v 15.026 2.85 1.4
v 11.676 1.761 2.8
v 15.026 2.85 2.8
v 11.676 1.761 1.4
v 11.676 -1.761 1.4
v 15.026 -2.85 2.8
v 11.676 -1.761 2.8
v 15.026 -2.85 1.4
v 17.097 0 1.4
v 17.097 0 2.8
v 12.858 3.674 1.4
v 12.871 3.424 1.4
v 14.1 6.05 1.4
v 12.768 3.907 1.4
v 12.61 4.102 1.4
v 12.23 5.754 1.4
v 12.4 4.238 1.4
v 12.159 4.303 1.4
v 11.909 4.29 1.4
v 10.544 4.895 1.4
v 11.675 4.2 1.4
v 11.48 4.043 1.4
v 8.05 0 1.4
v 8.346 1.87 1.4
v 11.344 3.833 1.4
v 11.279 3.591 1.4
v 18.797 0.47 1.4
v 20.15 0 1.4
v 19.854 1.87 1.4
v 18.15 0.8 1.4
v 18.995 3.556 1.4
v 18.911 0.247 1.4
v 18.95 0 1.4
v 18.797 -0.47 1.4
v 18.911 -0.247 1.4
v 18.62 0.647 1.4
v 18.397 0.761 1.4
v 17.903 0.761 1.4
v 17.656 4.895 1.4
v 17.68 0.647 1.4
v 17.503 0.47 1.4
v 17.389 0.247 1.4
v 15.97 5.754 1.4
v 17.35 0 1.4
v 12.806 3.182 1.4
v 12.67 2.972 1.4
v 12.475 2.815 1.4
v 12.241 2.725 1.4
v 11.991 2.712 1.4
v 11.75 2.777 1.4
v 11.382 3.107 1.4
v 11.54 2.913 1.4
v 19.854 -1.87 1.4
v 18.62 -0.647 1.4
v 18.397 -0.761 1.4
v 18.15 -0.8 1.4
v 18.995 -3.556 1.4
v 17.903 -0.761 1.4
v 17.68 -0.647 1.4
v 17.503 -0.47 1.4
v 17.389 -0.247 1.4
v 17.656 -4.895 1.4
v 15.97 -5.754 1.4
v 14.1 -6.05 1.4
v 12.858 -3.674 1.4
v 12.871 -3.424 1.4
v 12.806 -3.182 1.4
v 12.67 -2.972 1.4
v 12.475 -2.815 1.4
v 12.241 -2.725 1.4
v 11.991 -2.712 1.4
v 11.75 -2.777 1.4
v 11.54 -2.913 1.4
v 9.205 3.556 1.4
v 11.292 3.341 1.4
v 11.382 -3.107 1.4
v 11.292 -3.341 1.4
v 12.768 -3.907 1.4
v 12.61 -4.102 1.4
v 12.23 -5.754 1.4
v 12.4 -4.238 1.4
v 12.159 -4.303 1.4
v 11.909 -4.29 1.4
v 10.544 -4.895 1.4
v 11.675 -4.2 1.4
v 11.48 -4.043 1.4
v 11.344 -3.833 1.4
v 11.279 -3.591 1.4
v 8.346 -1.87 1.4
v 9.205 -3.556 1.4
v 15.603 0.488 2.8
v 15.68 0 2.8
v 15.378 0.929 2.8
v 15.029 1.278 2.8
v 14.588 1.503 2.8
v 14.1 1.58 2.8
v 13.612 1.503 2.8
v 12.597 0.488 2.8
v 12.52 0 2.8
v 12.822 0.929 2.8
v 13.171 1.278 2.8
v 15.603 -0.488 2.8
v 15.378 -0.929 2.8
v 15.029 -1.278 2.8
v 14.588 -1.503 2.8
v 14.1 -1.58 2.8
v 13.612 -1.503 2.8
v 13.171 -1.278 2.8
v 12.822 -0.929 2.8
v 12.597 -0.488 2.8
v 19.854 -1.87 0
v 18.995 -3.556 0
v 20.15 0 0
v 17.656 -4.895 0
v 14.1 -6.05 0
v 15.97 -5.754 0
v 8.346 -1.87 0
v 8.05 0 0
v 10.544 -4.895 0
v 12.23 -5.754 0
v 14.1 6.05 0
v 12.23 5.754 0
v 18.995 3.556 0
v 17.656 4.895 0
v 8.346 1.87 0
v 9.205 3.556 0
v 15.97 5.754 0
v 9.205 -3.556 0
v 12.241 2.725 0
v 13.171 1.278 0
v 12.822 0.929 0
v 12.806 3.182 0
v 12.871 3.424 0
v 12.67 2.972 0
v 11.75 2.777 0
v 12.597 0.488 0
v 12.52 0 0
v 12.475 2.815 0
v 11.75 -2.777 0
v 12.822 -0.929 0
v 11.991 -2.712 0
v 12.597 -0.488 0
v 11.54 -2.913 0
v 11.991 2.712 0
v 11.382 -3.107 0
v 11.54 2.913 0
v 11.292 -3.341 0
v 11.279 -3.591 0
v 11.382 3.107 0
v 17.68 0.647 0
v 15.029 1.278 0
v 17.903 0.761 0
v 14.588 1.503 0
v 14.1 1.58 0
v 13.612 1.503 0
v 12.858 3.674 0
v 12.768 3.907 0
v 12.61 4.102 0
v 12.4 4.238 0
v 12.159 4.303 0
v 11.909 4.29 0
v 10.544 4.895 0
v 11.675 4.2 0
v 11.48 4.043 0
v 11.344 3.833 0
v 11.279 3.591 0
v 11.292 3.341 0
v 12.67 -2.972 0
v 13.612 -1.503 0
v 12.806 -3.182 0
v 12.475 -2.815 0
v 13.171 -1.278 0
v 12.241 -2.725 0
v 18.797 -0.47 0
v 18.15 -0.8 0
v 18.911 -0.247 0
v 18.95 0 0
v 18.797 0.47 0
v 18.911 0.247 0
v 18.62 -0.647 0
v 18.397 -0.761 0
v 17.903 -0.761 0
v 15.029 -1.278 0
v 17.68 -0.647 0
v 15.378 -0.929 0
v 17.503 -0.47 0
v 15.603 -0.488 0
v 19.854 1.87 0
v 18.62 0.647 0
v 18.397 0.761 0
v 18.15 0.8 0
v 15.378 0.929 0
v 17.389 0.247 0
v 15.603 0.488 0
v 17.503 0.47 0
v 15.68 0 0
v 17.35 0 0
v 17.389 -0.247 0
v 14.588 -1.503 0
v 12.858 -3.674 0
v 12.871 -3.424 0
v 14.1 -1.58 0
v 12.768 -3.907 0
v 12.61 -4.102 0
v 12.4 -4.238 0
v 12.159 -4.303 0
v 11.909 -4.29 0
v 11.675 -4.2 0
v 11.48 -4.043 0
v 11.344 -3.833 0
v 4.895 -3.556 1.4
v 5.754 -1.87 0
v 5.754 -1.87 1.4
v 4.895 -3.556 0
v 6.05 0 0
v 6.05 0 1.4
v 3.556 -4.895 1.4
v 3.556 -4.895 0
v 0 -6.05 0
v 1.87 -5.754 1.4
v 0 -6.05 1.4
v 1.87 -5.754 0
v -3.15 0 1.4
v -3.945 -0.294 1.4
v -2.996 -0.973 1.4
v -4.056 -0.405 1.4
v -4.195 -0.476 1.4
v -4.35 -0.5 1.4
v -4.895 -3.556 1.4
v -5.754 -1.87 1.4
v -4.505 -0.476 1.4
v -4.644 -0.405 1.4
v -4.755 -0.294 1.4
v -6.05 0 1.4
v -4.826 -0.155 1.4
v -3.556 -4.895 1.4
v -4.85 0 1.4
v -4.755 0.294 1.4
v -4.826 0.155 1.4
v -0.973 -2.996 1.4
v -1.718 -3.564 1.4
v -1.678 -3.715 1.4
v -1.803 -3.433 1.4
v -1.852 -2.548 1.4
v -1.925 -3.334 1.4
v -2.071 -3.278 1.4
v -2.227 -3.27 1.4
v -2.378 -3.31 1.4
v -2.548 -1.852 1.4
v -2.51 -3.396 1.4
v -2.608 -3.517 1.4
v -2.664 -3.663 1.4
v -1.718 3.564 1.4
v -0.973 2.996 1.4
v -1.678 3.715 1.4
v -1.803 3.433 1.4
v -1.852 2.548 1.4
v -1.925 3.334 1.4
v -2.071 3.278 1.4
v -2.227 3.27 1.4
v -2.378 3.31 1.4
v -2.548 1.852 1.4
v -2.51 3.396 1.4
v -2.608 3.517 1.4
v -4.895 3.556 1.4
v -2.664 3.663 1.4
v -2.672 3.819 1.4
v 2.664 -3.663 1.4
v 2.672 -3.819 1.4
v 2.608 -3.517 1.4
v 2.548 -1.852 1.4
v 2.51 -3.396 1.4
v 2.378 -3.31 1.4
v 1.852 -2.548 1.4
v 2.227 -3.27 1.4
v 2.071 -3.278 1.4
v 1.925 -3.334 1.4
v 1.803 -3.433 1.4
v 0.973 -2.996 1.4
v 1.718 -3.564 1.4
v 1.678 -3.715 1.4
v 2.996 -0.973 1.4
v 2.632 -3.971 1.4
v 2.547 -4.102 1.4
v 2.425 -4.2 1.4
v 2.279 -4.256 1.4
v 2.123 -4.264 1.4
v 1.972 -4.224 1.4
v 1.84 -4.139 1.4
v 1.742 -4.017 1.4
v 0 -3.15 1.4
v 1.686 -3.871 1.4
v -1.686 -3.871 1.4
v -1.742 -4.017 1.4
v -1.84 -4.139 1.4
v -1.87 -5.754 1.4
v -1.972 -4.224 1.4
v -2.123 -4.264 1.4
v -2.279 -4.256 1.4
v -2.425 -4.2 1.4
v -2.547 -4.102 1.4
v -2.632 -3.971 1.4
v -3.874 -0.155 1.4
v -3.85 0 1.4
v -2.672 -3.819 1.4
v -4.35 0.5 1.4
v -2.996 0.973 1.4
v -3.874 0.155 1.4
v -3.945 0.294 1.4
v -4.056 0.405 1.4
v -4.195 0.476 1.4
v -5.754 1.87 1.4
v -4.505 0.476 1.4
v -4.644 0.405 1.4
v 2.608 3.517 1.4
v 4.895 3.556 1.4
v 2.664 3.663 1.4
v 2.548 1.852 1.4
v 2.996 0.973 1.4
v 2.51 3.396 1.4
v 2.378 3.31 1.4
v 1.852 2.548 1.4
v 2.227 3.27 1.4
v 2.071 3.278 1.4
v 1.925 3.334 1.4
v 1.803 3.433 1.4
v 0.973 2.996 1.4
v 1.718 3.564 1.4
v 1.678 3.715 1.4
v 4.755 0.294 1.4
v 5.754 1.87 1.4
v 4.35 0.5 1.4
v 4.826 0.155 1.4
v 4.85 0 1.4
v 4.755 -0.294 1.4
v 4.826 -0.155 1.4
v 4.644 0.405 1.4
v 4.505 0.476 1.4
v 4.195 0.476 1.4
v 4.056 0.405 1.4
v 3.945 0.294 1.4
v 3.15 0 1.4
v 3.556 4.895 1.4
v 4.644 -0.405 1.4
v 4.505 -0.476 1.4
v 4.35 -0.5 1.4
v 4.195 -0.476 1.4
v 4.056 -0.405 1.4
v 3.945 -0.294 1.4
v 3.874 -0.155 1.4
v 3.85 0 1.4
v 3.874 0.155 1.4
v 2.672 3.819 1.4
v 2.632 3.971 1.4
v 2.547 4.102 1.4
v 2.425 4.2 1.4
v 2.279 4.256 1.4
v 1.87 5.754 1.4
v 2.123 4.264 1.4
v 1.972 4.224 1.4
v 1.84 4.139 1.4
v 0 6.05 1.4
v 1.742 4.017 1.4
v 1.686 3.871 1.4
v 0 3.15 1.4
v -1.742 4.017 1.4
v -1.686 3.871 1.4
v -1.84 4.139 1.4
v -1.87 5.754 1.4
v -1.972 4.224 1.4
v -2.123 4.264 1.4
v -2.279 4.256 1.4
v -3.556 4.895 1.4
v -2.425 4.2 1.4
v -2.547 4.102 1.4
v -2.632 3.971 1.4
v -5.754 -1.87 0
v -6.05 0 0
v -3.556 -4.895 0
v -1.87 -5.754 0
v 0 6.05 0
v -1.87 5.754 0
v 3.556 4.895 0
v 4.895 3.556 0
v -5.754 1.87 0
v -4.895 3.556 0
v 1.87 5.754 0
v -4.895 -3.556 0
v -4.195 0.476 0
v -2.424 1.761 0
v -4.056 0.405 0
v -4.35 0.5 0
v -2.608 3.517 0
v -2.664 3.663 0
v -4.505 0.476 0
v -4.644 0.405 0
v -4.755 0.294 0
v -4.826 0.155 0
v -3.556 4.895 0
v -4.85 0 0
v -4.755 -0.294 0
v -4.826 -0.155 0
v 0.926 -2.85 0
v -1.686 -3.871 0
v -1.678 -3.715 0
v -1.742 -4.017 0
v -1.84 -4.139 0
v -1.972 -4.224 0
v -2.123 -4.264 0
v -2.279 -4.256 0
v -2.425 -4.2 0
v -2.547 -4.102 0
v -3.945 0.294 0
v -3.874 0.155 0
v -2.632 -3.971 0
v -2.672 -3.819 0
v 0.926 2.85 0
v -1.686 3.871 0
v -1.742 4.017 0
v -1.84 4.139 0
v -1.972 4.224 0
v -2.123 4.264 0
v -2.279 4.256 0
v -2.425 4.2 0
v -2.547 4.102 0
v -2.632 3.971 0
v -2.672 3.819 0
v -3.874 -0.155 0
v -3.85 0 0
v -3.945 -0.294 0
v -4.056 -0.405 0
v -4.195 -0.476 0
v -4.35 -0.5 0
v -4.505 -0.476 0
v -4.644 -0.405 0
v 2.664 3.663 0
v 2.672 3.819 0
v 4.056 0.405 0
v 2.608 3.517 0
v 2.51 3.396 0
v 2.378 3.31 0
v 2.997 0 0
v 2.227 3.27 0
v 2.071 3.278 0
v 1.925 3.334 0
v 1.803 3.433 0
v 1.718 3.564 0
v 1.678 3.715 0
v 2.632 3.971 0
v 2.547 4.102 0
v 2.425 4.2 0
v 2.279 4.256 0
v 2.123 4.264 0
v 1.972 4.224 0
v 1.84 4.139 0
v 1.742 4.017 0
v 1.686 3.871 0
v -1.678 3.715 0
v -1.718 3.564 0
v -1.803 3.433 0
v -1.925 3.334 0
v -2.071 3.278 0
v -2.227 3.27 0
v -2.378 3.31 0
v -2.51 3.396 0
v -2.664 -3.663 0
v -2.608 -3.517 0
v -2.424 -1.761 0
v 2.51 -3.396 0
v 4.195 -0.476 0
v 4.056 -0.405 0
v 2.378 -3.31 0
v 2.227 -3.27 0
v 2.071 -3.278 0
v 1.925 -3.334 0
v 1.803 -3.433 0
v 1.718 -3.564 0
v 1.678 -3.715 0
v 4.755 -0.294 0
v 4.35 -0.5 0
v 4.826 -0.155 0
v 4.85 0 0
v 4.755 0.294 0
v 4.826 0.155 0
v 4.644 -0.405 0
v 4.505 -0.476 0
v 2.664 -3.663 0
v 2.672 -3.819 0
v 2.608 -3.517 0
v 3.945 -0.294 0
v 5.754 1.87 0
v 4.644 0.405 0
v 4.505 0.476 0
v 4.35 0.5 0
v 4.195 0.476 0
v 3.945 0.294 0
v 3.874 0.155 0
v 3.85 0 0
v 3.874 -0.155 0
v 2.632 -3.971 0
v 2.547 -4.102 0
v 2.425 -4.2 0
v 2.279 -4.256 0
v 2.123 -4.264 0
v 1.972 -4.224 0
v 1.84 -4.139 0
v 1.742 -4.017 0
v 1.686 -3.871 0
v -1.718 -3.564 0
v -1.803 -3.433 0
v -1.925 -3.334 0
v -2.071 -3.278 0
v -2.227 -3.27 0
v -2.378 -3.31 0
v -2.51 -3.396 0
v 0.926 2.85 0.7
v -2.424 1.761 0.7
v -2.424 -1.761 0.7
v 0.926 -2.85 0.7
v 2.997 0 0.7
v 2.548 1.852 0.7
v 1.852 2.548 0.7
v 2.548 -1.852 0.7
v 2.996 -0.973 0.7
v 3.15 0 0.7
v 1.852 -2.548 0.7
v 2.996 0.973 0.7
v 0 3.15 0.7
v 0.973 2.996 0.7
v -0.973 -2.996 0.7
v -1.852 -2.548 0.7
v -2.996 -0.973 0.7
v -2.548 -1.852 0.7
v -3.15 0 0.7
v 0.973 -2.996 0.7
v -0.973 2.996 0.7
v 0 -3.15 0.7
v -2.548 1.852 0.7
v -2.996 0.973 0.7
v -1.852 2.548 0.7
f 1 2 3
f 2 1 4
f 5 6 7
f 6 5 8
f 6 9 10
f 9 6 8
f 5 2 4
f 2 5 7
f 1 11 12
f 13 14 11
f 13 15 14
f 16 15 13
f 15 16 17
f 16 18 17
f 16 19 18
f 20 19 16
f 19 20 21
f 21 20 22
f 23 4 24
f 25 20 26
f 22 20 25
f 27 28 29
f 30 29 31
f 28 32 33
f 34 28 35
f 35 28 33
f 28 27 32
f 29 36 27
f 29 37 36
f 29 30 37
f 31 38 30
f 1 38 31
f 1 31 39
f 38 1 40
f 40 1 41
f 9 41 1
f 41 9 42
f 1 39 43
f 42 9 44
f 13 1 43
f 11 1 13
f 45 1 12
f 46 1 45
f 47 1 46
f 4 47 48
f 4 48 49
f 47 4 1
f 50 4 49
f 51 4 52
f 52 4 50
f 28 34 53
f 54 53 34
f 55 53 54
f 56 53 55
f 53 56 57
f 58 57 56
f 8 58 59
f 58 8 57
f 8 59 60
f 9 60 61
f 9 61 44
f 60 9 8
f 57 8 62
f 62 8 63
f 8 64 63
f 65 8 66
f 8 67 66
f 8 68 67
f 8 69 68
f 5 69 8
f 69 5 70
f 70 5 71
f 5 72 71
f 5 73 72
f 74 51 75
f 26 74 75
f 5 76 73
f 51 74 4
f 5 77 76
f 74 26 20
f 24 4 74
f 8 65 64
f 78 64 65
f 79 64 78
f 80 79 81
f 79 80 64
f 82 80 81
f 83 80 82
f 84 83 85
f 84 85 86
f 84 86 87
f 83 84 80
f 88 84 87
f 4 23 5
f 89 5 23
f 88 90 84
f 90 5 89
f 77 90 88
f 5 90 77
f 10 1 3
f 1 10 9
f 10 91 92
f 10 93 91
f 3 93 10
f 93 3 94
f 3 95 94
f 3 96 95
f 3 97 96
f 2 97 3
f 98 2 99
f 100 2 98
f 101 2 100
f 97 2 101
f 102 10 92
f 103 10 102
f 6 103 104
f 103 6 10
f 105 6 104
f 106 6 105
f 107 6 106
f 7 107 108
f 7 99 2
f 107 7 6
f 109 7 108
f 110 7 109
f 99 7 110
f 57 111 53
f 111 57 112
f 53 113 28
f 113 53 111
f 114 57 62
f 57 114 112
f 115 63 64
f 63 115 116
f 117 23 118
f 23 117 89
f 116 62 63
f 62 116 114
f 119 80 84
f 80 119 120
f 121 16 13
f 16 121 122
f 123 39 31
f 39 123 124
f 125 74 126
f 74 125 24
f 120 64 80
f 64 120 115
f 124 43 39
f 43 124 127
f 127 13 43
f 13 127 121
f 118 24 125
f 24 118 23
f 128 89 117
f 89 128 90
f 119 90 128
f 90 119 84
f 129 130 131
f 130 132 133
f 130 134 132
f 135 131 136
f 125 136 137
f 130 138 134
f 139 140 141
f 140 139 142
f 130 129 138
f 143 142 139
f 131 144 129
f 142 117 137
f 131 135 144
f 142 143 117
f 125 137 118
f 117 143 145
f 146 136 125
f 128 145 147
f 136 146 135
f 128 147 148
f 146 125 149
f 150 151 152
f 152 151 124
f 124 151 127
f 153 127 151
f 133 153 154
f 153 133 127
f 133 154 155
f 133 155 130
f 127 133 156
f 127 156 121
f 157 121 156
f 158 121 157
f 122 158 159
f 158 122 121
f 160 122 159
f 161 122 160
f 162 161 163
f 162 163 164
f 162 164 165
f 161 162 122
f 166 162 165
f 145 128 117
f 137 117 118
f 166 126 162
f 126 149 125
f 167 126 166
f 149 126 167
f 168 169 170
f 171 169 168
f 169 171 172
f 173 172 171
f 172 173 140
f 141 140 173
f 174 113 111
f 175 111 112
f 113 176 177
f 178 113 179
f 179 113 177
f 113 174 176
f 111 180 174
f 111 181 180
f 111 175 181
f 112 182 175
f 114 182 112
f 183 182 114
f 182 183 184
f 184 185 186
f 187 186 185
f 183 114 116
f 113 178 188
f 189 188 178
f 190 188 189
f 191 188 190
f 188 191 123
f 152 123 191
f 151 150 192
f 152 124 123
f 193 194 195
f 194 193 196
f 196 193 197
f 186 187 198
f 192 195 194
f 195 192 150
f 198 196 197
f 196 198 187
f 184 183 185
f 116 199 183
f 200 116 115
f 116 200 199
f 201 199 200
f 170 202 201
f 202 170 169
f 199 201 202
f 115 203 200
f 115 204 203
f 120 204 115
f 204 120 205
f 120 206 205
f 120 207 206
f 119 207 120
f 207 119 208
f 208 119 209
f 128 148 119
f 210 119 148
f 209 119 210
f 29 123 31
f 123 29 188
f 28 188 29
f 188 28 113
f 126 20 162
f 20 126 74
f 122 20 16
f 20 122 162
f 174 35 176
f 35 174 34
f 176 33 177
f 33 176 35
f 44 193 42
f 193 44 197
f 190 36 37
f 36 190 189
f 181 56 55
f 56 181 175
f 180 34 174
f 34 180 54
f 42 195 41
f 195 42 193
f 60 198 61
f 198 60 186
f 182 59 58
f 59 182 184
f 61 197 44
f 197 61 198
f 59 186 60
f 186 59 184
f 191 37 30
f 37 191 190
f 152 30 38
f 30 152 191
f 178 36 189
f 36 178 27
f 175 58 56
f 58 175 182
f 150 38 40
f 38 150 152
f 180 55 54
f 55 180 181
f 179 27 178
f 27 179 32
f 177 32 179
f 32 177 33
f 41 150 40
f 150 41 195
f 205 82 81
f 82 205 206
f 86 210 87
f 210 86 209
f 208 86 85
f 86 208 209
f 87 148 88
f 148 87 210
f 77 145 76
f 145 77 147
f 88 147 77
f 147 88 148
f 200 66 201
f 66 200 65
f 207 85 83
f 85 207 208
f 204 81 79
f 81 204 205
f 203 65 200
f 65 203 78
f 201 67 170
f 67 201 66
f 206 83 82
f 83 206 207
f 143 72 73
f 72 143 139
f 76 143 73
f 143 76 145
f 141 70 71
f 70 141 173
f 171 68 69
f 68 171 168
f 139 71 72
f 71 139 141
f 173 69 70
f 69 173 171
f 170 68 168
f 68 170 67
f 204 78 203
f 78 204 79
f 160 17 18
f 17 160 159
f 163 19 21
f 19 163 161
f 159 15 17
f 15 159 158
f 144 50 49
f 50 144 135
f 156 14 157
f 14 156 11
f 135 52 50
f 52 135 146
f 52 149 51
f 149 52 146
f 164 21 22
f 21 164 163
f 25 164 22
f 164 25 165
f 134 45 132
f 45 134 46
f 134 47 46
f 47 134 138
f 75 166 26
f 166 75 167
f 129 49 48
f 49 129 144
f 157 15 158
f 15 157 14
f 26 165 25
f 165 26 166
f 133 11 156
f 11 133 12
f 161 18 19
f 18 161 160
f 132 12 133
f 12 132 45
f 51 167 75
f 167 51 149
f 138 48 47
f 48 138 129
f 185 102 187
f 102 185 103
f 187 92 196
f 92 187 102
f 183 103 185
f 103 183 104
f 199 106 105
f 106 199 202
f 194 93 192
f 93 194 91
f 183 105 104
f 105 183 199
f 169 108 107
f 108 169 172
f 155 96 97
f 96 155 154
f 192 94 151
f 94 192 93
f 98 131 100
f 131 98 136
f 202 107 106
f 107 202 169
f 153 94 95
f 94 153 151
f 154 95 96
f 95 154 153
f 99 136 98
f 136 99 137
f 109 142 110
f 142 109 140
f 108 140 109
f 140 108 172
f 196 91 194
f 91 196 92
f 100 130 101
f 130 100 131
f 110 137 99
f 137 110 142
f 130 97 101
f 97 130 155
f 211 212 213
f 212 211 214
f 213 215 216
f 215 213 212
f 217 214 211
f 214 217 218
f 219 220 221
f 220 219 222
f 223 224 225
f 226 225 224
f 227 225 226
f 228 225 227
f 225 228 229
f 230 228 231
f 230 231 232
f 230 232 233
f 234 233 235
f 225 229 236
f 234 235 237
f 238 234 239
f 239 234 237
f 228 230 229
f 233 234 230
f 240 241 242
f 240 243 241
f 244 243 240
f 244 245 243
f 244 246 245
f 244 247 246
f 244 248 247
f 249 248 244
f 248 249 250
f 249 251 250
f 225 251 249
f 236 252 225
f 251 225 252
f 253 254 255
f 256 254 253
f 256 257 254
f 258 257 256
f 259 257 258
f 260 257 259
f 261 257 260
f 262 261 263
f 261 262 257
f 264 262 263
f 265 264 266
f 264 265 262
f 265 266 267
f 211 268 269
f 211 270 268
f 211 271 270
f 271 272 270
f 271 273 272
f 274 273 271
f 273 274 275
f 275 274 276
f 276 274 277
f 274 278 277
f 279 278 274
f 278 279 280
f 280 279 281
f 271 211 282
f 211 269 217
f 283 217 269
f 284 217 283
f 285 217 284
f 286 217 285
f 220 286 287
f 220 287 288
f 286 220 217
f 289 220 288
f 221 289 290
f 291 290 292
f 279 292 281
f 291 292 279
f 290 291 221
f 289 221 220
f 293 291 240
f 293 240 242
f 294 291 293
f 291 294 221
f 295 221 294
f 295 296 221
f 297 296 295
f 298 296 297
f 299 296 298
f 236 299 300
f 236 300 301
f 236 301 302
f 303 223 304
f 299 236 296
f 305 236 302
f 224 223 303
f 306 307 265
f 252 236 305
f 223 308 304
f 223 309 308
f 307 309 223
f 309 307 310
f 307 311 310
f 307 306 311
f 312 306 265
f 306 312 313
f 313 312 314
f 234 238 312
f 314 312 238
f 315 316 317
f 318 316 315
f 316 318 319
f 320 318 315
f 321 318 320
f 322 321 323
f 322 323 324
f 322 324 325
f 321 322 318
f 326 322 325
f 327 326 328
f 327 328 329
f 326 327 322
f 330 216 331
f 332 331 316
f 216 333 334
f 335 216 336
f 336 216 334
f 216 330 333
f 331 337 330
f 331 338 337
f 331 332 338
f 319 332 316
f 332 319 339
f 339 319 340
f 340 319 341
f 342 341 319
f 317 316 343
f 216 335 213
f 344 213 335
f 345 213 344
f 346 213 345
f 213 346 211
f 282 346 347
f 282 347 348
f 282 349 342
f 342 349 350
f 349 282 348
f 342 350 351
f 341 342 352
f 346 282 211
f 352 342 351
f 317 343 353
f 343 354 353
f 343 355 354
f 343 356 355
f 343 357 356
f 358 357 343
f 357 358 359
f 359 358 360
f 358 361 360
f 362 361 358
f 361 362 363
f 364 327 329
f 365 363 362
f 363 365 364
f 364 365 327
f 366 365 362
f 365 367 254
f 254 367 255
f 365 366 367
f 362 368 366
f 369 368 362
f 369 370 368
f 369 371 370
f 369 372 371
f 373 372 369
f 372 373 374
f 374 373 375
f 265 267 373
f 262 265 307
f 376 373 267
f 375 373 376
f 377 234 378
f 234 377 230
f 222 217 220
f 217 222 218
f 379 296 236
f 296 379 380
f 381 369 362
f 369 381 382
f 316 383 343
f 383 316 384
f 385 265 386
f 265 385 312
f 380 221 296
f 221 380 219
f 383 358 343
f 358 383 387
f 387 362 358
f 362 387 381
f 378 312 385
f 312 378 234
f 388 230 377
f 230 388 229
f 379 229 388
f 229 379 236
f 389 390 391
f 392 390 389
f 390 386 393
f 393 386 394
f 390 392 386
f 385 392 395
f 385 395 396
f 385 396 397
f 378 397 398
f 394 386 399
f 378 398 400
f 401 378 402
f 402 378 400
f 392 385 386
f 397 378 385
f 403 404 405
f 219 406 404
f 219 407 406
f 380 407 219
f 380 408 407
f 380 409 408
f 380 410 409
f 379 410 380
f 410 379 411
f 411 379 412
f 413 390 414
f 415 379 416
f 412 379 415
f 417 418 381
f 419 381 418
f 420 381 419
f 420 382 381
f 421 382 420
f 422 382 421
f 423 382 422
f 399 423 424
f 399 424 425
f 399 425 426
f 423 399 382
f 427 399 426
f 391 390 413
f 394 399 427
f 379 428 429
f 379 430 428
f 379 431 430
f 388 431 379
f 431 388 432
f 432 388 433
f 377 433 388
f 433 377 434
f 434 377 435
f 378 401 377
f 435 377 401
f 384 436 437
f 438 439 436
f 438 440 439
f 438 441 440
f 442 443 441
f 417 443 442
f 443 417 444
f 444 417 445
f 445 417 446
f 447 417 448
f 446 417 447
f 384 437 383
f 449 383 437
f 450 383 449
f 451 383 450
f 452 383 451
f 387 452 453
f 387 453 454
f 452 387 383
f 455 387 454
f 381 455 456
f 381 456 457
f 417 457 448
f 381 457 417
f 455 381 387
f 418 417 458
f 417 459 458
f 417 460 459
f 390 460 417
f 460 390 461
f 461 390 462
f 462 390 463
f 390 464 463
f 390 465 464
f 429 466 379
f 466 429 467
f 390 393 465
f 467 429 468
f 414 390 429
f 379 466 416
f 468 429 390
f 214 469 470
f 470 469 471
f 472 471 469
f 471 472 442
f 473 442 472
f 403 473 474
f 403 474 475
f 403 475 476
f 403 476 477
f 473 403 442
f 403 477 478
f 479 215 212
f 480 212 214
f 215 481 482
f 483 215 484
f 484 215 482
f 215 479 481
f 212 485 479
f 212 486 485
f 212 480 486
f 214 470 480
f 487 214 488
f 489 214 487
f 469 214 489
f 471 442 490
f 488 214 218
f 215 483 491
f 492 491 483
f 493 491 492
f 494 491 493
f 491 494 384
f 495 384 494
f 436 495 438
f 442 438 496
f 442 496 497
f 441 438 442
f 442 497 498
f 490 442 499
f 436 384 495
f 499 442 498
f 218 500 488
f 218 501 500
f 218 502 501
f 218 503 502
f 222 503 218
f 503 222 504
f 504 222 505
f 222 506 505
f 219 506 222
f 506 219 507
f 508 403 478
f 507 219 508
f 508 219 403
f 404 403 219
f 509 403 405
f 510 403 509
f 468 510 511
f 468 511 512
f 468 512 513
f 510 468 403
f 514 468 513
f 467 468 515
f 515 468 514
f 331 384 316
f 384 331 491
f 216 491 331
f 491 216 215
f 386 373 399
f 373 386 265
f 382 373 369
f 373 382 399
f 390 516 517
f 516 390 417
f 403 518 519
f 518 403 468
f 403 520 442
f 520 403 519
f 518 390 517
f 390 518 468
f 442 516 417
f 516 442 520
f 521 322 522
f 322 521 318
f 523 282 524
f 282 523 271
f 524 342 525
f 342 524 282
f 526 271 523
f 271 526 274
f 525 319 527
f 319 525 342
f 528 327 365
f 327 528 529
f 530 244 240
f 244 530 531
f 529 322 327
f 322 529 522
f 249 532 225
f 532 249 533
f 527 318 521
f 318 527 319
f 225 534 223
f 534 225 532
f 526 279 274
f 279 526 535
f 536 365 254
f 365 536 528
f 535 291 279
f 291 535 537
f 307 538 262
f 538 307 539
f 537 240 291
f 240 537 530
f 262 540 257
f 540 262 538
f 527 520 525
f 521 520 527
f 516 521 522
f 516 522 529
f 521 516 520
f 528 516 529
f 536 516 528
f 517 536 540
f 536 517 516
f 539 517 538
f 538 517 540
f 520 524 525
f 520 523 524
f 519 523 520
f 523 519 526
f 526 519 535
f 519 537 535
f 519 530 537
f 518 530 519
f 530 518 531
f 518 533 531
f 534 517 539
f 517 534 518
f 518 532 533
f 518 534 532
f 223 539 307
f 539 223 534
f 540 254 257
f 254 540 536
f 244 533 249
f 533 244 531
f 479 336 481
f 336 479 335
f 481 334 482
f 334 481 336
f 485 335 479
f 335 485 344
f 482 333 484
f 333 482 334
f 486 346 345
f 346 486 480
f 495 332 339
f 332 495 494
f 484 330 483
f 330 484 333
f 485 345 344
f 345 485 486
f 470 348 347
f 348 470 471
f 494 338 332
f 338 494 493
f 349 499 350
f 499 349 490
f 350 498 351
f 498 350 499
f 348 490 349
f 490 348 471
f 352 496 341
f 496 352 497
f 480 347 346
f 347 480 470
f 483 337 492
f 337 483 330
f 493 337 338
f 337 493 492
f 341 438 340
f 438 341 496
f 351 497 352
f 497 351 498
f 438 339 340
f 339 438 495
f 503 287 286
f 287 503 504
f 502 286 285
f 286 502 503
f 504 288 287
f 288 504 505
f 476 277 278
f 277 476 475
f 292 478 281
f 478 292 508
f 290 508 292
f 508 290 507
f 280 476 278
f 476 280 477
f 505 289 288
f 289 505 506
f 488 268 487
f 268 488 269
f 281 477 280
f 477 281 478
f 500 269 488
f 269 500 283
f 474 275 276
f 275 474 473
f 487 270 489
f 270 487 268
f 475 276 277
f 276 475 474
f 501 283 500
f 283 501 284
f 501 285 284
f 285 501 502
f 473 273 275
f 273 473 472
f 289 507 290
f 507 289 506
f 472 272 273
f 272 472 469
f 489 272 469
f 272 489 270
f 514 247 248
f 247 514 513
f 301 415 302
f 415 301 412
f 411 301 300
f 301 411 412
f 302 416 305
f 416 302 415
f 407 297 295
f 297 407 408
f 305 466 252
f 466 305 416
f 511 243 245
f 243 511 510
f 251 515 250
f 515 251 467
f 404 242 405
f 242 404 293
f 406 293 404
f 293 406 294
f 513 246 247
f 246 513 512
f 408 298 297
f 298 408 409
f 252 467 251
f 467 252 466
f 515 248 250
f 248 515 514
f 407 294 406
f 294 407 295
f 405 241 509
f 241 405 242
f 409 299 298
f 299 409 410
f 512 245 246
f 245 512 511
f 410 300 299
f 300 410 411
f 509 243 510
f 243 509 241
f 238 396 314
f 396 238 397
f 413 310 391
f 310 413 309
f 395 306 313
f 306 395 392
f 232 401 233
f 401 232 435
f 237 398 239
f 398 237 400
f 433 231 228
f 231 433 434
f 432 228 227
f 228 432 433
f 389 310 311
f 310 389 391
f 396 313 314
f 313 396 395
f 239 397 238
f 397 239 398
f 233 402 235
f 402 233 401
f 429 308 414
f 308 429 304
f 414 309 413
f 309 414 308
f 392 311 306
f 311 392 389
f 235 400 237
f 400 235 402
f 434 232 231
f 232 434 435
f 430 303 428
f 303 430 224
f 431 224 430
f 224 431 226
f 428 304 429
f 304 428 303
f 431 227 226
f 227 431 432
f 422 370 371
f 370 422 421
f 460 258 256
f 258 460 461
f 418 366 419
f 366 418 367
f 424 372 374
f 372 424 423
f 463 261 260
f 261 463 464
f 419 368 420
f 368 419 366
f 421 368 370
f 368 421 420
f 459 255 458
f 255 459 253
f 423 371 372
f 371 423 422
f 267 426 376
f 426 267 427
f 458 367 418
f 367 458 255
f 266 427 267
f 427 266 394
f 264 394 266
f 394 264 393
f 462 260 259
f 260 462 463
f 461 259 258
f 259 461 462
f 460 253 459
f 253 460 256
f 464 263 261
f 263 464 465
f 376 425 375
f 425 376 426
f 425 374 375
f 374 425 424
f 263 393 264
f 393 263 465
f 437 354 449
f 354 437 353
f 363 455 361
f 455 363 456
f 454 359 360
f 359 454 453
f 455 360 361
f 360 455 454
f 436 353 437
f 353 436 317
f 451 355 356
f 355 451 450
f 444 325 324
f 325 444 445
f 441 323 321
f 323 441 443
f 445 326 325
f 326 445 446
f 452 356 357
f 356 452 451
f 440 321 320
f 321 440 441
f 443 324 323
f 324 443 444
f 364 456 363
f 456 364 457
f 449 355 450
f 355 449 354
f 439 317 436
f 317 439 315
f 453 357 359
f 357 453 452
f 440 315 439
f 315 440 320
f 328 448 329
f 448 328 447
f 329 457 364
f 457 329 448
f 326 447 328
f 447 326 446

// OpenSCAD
shaft_diameter = 3.16; //schumi 3.16
cylinder_diameter = 12.1;  //12.1 xray
hole_edge_distance = 1.2;  //12mm borelle 1.2?
clip_inbetween_height = 2.8; //schumi 2.8

//TODO: opening gap as parameter

clip_diameter = 6.1; //schumi 6.1
clip_thickness = 0.3; //schumi 0.3
bottom_height = 0.6; //configurable as how strong the valve disc bottom floor is

num_piston_holes = 3;
num_valve_holes = 6;
piston_hole_diameter = 1.6;
valve_hole_diameter = 1.0;

disc_height = clip_inbetween_height /2;  //empirical: schumin clippiväliin 1.5
lock_inner_scaledown = 0.95;
lock_width = shaft_diameter + (cylinder_diameter/3 - hole_edge_distance);
lock_length = shaft_diameter + 1.2;
lock_height = disc_height;

top_clip_recess_radius = clip_diameter/2 + 0.1;

//mismatches all holes
//would require disc sides to pass some oil
//try $fn=8 -> 12
//hole_offset_degrees = 360/num_valve_holes/2;
hole_offset_degrees = 0;

render_disc_distance = 0;

$vpr = [70, 0, $t * 360];

$fn=20;

//male lock shape from adding lock (scaled down to fit the female shape)
module piston_disc() {
  translate ([0,0, - disc_height/2]) 
  scale([lock_inner_scaledown]) lock();
  base_disc(); 
}

//female lock shape from difference
module valve_disc() {
  difference() {
    base_disc();
    translate ([0,0, + lock_height/2 + bottom_height]) lock();
    translate ([0,0,0]) lock();
    translate ([0,0,-0.1]) cylinder(disc_height - bottom_height, top_clip_recess_radius, top_clip_recess_radius);
  } 
}

//shape used to lock the disc rotation
module lock() {
    //basic rectangular shape
    //cube([lock_length, lock_width, lock_height], true);
    
    //n-sided cylinder
    cylinder($fn=5, r1= lock_width/2, r2=lock_width/2, h=lock_height, center=true);
}

module holed_piston_disc() {
    difference() {
        piston_disc();
        piston_holes();
        shaft();
    }
}

module holed_valve_disc() {
    difference() {
        valve_disc();
        valve_holes();
    }
}

module piston_holes() {
    holes(hole_offset_degrees, num_piston_holes, piston_hole_diameter);
}

module valve_holes() {
    holes(0, num_valve_holes, valve_hole_diameter);
}


module base_disc() {
    color("DimGray", 0.8) cylinder(disc_height,cylinder_diameter/2,cylinder_diameter/2);
}

module holes(offset=0, num_of_holes=3, dia=1) {
    for ( i = [0:num_of_holes+1] ) {
		       	rotate( i*360/num_of_holes + offset, [0, 0, 1])		
				translate([cylinder_diameter/2 - dia/2 - hole_edge_distance, 0, 0]) cylinder(h=100, r=dia/2, center=true);}
}

//used primarily for shaft hole punching
module shaft() {
    translate ([0,0,-40 + disc_height + clip_thickness]) color("DarkGoldenrod", 1) cylinder(40, shaft_diameter/2, shaft_diameter/2);
}





//Actual drawing calls
module draw_demo() {
    rotate([180,0,0]) translate([0,0, - (disc_height - bottom_height)]) holed_valve_disc();


    translate([0,0, - clip_inbetween_height/2 + clip_thickness/2])
    rotate([180,0,0]) holed_piston_disc();     
    translate([0,0, -1]) shaft();
    //translate([0,0, - bottom_height + clip_thickness/2])

    translate([0,0, + clip_thickness/2])
    draw_clip(); //upper clip
    translate([0,0, - clip_inbetween_height - clip_thickness/2]) draw_clip(); //lower clip
}       

module draw_clip() {
    difference() {
       color("Black", 0.8) cylinder(clip_thickness, clip_diameter/2*0.9, clip_diameter/2*0.9);
    }
}

module draw_animation() {
        
    holed_piston_disc();
 
    translate([0,0, - 7 + $t]) 
        holed_valve_disc();
    }

module draw_print(num_of_pairs=1) {
//       for ( i = [0:num_of_pairs+1] ) {
           translate([cylinder_diameter + 2, 0,disc_height]) rotate([180,0,0]) holed_piston_disc();
           translate([0, 0,disc_height]) rotate([180,0,0]) holed_valve_disc();
  //     }
}

draw_print();  
//draw_demo();
